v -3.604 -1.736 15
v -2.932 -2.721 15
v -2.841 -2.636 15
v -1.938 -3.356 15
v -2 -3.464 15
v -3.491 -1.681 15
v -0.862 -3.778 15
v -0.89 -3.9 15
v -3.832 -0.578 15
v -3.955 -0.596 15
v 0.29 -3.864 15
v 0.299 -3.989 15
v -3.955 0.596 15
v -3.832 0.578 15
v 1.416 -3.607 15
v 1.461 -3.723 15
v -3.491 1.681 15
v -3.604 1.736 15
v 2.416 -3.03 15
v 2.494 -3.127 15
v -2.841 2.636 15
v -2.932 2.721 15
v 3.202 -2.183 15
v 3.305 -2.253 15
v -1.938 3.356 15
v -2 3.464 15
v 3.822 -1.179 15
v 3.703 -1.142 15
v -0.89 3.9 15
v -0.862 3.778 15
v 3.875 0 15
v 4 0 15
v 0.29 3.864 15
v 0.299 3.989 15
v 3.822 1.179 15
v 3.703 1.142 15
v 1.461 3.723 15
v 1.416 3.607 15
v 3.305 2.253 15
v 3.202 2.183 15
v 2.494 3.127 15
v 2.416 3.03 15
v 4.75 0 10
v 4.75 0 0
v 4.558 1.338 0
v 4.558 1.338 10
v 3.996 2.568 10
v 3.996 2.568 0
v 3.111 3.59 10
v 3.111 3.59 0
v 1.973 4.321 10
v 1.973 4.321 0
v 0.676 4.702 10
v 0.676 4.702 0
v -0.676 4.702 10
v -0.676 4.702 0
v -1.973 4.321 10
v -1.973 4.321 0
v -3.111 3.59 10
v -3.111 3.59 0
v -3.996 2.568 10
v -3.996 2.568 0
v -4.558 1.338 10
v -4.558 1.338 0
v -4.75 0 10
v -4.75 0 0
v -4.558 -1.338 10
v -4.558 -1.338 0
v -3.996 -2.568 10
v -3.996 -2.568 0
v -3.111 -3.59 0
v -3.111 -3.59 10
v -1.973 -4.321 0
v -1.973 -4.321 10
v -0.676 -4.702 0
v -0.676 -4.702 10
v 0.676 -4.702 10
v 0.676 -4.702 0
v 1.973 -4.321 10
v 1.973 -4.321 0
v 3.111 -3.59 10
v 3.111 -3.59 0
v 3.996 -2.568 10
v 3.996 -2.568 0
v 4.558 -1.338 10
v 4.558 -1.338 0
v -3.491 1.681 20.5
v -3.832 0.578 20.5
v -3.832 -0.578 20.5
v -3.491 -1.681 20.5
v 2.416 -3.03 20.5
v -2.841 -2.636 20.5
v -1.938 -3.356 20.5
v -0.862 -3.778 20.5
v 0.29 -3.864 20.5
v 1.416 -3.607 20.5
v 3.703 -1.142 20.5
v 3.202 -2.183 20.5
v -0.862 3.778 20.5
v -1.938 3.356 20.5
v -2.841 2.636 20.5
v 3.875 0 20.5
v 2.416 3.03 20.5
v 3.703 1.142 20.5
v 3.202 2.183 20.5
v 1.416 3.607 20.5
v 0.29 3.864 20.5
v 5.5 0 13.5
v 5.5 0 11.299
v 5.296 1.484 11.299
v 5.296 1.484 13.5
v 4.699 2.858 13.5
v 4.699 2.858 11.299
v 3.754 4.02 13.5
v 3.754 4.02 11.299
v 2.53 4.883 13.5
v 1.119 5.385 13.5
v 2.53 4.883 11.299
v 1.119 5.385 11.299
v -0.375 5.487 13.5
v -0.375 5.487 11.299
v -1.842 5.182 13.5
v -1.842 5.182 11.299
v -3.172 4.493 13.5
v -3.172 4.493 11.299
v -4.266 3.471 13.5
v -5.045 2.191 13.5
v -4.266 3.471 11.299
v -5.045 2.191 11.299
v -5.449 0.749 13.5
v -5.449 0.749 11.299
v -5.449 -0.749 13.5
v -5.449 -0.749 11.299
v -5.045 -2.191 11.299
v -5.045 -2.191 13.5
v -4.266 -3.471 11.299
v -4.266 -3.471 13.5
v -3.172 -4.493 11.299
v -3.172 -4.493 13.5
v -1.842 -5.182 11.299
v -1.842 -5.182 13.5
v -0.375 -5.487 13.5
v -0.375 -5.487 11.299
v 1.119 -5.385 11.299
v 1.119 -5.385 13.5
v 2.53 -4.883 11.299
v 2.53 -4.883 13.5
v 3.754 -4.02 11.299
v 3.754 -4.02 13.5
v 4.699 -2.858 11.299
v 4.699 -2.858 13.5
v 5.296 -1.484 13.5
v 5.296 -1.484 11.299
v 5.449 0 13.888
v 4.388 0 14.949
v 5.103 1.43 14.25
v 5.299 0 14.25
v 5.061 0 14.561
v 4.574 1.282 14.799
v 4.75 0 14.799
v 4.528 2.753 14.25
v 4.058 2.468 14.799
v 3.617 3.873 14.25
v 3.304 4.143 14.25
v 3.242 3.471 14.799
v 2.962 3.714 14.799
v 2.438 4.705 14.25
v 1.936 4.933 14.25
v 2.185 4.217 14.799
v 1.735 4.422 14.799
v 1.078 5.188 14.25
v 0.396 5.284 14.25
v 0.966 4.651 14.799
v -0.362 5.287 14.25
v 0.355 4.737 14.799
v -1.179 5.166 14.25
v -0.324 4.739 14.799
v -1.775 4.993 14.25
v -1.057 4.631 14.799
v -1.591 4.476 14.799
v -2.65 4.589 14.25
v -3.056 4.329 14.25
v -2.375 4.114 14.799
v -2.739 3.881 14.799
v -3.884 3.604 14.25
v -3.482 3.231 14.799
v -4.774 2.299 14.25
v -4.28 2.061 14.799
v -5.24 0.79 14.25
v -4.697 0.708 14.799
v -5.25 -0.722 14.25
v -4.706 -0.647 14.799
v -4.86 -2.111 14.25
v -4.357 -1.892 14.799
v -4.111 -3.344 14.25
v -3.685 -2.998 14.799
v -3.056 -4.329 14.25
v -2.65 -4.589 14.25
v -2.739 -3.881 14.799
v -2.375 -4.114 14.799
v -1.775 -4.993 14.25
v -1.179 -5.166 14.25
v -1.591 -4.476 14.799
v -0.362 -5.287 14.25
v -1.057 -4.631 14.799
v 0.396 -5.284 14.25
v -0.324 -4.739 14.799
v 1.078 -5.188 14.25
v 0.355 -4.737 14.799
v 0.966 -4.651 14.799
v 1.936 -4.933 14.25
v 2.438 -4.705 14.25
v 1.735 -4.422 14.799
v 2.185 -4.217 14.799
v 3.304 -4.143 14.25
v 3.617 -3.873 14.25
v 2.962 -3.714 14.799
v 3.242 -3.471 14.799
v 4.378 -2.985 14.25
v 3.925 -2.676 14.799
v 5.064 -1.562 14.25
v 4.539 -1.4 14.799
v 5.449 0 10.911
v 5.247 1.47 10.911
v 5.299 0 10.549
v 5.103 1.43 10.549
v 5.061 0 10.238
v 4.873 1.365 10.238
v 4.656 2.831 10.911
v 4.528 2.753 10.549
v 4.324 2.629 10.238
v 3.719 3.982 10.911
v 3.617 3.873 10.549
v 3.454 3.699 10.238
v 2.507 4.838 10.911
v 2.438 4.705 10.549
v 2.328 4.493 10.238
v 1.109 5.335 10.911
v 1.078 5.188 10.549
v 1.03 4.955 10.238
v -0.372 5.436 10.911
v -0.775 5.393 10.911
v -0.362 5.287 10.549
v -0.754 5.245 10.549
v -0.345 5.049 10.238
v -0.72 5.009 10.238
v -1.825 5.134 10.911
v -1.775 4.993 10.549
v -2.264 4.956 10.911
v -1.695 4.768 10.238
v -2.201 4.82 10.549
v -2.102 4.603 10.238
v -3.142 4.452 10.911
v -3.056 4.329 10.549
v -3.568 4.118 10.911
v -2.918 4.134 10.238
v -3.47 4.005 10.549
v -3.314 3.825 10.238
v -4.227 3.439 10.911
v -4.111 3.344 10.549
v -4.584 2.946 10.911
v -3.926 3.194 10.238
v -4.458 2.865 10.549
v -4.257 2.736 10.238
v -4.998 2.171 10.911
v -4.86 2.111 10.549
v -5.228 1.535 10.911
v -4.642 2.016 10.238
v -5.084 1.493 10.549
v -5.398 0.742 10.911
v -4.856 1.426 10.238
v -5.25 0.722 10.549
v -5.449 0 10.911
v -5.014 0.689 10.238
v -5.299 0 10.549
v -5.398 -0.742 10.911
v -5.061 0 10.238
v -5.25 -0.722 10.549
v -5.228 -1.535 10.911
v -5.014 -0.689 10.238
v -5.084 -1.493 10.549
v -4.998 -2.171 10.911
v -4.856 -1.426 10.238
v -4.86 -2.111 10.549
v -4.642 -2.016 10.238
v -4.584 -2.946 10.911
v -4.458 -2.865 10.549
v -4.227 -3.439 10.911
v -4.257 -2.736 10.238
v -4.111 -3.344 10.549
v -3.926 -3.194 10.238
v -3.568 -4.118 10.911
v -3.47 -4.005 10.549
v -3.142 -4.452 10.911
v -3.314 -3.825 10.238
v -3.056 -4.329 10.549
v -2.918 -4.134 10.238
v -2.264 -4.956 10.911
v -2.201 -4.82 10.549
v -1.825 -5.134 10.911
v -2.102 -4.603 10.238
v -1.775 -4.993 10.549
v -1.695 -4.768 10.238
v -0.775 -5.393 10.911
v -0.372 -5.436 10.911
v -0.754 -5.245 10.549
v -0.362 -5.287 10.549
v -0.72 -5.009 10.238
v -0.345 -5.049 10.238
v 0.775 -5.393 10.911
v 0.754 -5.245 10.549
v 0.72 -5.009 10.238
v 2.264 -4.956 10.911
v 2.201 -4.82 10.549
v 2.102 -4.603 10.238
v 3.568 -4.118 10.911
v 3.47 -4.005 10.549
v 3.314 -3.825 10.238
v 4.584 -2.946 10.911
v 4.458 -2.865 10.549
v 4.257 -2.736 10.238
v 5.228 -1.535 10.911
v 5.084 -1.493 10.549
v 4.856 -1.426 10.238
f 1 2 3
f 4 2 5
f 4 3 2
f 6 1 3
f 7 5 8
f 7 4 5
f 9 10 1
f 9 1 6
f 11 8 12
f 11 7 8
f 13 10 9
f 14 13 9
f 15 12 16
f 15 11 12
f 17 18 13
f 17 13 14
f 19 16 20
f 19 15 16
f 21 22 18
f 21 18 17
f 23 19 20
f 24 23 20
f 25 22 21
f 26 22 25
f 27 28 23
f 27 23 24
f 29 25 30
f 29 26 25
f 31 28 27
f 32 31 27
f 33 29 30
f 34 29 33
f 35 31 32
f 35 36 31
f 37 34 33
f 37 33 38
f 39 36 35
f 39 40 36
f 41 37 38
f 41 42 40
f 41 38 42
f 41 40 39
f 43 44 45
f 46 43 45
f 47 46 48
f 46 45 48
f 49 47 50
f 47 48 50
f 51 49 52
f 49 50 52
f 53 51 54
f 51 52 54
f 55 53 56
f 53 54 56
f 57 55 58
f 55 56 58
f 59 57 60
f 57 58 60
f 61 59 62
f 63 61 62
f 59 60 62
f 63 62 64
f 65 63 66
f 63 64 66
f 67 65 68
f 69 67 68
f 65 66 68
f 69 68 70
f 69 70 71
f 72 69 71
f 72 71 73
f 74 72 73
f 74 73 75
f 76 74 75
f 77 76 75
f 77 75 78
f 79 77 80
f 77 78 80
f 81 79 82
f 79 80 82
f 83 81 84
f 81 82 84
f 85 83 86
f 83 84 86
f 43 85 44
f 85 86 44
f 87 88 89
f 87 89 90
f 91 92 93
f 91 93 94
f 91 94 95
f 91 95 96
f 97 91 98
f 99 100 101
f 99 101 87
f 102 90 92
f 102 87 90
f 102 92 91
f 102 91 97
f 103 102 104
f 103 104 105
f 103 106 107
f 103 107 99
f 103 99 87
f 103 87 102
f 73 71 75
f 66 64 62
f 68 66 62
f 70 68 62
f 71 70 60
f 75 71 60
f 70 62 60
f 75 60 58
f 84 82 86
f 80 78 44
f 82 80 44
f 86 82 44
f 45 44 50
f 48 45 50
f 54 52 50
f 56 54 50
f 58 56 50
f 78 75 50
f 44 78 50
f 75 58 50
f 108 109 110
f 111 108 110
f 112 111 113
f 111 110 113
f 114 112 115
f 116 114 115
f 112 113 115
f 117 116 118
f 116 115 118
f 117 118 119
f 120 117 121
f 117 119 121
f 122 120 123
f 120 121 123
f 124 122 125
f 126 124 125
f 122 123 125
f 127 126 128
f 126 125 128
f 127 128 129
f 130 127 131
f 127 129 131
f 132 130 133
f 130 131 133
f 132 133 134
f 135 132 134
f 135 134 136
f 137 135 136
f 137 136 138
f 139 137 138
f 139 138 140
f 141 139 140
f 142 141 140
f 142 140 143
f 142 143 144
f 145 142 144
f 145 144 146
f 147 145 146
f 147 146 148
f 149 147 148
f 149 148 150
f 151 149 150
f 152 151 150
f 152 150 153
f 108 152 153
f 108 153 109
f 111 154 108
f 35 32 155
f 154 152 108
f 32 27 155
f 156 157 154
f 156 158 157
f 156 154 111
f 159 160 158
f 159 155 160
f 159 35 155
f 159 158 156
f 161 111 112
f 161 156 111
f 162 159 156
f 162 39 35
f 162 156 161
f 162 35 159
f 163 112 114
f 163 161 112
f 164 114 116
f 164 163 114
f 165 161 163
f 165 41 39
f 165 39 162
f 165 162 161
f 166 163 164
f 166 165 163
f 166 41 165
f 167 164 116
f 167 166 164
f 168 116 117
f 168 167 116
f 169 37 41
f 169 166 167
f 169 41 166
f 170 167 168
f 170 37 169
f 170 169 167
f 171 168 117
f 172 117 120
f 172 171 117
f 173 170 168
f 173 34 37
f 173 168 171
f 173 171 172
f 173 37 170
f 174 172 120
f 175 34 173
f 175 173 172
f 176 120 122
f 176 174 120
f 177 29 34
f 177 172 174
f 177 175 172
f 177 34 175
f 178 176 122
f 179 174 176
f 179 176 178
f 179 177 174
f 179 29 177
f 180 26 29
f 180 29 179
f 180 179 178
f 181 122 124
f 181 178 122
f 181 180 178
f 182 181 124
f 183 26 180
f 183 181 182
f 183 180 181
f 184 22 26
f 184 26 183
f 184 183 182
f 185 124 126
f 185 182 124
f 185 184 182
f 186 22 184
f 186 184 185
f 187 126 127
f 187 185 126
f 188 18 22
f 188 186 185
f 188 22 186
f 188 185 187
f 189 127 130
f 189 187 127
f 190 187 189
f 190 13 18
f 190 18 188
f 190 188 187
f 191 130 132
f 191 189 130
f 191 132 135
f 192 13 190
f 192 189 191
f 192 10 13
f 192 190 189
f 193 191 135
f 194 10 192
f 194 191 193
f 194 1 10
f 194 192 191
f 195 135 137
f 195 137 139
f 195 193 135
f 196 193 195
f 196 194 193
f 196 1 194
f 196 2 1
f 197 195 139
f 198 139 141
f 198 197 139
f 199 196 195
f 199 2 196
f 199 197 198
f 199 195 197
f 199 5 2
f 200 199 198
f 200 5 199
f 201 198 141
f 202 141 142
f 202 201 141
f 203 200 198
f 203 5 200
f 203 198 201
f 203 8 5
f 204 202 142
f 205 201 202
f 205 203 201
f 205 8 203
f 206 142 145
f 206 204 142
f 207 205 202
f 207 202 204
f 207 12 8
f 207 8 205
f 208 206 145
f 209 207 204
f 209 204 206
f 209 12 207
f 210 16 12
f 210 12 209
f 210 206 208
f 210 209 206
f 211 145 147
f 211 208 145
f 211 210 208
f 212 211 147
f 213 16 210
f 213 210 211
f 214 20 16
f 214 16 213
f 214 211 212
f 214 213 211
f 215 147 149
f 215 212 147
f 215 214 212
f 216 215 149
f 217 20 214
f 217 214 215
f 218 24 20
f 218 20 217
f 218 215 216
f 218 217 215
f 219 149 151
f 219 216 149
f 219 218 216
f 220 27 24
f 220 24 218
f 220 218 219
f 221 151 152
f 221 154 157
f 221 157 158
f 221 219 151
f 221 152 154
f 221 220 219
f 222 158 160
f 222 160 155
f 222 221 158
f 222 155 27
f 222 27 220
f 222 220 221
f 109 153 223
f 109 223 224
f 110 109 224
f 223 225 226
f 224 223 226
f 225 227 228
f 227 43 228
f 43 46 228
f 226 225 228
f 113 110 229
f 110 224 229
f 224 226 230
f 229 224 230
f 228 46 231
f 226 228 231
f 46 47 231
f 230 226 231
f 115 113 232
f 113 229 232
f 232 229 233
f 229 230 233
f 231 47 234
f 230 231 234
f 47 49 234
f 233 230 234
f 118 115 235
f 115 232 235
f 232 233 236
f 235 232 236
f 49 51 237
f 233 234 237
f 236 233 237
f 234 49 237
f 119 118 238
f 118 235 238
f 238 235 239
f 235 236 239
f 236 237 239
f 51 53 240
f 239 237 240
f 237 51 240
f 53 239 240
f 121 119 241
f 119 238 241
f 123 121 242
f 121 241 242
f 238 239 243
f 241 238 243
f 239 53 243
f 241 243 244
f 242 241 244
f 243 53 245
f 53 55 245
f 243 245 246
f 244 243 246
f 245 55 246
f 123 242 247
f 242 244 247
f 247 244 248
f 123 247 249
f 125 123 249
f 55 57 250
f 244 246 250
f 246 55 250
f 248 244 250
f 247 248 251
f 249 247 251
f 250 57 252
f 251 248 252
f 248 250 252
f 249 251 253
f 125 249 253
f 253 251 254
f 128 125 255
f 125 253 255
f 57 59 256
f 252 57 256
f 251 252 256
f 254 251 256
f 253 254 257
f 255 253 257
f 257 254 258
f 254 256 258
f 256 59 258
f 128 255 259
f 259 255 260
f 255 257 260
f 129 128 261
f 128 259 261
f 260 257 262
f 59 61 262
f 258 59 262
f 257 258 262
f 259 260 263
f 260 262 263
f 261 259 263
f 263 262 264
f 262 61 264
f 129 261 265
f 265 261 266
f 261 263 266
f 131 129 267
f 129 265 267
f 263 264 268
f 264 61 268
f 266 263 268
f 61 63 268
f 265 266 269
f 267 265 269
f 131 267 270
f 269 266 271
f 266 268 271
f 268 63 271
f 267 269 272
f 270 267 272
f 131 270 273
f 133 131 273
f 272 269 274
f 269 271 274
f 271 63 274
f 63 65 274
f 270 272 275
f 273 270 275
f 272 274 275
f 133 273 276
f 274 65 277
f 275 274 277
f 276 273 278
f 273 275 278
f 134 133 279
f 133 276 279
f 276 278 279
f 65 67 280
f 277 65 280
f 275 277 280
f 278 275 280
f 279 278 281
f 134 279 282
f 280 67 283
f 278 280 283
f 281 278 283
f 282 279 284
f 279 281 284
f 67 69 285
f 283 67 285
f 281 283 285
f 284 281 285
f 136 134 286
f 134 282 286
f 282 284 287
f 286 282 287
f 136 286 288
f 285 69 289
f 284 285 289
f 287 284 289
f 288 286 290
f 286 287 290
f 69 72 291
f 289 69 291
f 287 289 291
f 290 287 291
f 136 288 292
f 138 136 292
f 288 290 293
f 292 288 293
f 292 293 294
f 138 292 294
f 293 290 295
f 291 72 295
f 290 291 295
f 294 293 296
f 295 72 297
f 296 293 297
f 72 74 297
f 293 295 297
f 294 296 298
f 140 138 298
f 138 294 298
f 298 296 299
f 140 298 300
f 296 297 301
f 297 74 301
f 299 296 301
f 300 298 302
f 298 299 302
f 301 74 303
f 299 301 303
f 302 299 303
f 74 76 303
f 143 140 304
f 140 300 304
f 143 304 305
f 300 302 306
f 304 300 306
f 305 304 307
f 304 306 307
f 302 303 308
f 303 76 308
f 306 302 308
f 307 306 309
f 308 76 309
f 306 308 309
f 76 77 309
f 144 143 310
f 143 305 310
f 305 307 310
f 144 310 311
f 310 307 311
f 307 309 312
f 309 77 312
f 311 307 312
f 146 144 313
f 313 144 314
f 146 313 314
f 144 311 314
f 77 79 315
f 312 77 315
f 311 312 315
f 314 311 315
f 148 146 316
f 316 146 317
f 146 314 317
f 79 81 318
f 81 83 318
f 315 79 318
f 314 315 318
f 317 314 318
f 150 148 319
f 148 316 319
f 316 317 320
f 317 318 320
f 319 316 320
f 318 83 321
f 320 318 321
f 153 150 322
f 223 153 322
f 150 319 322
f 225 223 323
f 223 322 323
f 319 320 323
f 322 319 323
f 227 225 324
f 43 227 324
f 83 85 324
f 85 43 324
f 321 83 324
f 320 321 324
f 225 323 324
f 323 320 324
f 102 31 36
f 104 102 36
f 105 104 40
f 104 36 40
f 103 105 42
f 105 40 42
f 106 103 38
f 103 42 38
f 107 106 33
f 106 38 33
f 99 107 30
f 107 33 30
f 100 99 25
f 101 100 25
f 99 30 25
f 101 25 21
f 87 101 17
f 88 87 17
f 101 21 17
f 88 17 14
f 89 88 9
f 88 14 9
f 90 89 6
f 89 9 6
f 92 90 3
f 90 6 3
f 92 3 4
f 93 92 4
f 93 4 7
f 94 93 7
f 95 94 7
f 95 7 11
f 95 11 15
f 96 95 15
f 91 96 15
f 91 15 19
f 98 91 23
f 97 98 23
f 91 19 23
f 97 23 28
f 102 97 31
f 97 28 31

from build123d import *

# Parameters (mm, degrees)
F0_R     = 4.75
F1_DEPTH = 10
F2_R     = 5.5
F3_DEPTH = 5
F4_R     = 3.875
F5_DEPTH = 5.5


# Not quite as in the source:
# - a fillet or chamfer that OpenCascade refuses, or shapes differently, is made with other operations: its cross-section is extruded or revolved along the edge and cut away or added


with BuildPart() as f1:
    # F0 (on Top) → F1 (new body)
    with BuildSketch(Plane.XY):
        Circle(F0_R)
    extrude(amount=F1_DEPTH)

    # F2 (on face) → F3 (join)
    with BuildSketch(Plane.XY.offset(10)):
        Circle(F2_R)
    extrude(amount=F3_DEPTH)

    # F4 (on face) → F5 (join)
    with BuildSketch(Plane.XY.offset(15)):
        Circle(F4_R)
    extrude(amount=F5_DEPTH)

    # F6: fillet of radius 1.5 on 2 edges, made by hand

    # F6_s1 → F6_t2 (revolve, cut)
    with BuildSketch(Plane.XZ):
        with BuildLine():
            ThreePointArc((5.5, 13.5), (5.0606601718, 14.5606601718), (4, 15))
            Line((4, 15), (5.5, 15))
            Line((5.5, 15), (5.5, 13.5))
        make_face()
    revolve(axis=Axis((0, 0, 15), (0, 0, 1)), mode=Mode.SUBTRACT)

    # F6_s3 → F6_t4 (revolve, cut)
    with BuildSketch(Plane.XZ):
        with BuildLine():
            ThreePointArc((5.5, 11.2990381057), (5.2990381057, 10.5490381057), (4.75, 10))
            Line((4.75, 10), (5.5, 10))
            Line((5.5, 10), (5.5, 11.2990381057))
        make_face()
    revolve(axis=Axis((0, 0, 10), (0, 0, 1)), mode=Mode.SUBTRACT)


solid = f1.part
